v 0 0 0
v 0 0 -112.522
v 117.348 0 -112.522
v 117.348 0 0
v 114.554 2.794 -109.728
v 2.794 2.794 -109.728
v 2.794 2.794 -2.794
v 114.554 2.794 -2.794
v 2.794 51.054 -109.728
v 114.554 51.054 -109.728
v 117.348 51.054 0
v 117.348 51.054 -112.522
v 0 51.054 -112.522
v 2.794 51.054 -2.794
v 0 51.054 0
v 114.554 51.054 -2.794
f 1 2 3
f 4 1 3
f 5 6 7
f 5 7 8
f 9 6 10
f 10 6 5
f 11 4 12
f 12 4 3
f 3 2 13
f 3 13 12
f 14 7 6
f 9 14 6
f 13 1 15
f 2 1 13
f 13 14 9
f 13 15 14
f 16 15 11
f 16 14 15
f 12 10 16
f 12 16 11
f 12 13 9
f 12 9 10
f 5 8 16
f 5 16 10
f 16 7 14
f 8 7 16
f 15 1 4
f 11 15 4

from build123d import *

# Parameters (mm, degrees)
SKETCH1_W           = 117.348
SKETCH1_H           = 112.522
BOSS_EXTRUDE1_DEPTH = 2.794
SKETCH3_W           = 114.554
SKETCH3_H           = 2.794
BOSS_EXTRUDE2_DEPTH = 48.26
LPATTERN1_COUNT     = 2
LPATTERN1_PITCH     = 109.728
SKETCH4_W           = 2.794
SKETCH4_H           = 106.934
BOSS_EXTRUDE3_DEPTH = 48.26
SKETCH6_W           = 2.794
SKETCH6_H           = 112.522
BOSS_EXTRUDE4_DEPTH = 48.26


with BuildPart() as part:
    # Sketch1 → Boss-Extrude1 (new body)
    with BuildSketch(Plane(origin=(0, 0, 0), x_dir=(1, 0, 0), z_dir=(0, 1, 0))):
        with Locations((58.674, 56.261)):
            Rectangle(SKETCH1_W, SKETCH1_H)
    extrude(amount=BOSS_EXTRUDE1_DEPTH)

    # Sketch3 → Boss-Extrude2 (add)
    with BuildSketch(Plane(origin=(0, 2.794, 0), x_dir=(1, 0, 0), z_dir=(0, 1, 0))):
        with Locations((57.277, 1.397)):
            Rectangle(SKETCH3_W, SKETCH3_H)
    boss_extrude2 = extrude(amount=BOSS_EXTRUDE2_DEPTH)

    # LPattern1: Boss-Extrude2 ×2
    with Locations(*[(0, 0, -i * LPATTERN1_PITCH) for i in range(1, LPATTERN1_COUNT)]):
        add(boss_extrude2)

    # Sketch4 → Boss-Extrude3 (add)
    with BuildSketch(Plane(origin=(0, 2.794, 0), x_dir=(1, 0, 0), z_dir=(0, 1, 0))):
        with Locations((1.397, 56.261)):
            Rectangle(SKETCH4_W, SKETCH4_H)
    extrude(amount=BOSS_EXTRUDE3_DEPTH)

    # Sketch6 → Boss-Extrude4 (add)
    with BuildSketch(Plane(origin=(0, 2.794, 0), x_dir=(1, 0, 0), z_dir=(0, 1, 0))):
        with Locations((115.951, 56.261)):
            Rectangle(SKETCH6_W, SKETCH6_H)
    extrude(amount=BOSS_EXTRUDE4_DEPTH)


solid = part.part
